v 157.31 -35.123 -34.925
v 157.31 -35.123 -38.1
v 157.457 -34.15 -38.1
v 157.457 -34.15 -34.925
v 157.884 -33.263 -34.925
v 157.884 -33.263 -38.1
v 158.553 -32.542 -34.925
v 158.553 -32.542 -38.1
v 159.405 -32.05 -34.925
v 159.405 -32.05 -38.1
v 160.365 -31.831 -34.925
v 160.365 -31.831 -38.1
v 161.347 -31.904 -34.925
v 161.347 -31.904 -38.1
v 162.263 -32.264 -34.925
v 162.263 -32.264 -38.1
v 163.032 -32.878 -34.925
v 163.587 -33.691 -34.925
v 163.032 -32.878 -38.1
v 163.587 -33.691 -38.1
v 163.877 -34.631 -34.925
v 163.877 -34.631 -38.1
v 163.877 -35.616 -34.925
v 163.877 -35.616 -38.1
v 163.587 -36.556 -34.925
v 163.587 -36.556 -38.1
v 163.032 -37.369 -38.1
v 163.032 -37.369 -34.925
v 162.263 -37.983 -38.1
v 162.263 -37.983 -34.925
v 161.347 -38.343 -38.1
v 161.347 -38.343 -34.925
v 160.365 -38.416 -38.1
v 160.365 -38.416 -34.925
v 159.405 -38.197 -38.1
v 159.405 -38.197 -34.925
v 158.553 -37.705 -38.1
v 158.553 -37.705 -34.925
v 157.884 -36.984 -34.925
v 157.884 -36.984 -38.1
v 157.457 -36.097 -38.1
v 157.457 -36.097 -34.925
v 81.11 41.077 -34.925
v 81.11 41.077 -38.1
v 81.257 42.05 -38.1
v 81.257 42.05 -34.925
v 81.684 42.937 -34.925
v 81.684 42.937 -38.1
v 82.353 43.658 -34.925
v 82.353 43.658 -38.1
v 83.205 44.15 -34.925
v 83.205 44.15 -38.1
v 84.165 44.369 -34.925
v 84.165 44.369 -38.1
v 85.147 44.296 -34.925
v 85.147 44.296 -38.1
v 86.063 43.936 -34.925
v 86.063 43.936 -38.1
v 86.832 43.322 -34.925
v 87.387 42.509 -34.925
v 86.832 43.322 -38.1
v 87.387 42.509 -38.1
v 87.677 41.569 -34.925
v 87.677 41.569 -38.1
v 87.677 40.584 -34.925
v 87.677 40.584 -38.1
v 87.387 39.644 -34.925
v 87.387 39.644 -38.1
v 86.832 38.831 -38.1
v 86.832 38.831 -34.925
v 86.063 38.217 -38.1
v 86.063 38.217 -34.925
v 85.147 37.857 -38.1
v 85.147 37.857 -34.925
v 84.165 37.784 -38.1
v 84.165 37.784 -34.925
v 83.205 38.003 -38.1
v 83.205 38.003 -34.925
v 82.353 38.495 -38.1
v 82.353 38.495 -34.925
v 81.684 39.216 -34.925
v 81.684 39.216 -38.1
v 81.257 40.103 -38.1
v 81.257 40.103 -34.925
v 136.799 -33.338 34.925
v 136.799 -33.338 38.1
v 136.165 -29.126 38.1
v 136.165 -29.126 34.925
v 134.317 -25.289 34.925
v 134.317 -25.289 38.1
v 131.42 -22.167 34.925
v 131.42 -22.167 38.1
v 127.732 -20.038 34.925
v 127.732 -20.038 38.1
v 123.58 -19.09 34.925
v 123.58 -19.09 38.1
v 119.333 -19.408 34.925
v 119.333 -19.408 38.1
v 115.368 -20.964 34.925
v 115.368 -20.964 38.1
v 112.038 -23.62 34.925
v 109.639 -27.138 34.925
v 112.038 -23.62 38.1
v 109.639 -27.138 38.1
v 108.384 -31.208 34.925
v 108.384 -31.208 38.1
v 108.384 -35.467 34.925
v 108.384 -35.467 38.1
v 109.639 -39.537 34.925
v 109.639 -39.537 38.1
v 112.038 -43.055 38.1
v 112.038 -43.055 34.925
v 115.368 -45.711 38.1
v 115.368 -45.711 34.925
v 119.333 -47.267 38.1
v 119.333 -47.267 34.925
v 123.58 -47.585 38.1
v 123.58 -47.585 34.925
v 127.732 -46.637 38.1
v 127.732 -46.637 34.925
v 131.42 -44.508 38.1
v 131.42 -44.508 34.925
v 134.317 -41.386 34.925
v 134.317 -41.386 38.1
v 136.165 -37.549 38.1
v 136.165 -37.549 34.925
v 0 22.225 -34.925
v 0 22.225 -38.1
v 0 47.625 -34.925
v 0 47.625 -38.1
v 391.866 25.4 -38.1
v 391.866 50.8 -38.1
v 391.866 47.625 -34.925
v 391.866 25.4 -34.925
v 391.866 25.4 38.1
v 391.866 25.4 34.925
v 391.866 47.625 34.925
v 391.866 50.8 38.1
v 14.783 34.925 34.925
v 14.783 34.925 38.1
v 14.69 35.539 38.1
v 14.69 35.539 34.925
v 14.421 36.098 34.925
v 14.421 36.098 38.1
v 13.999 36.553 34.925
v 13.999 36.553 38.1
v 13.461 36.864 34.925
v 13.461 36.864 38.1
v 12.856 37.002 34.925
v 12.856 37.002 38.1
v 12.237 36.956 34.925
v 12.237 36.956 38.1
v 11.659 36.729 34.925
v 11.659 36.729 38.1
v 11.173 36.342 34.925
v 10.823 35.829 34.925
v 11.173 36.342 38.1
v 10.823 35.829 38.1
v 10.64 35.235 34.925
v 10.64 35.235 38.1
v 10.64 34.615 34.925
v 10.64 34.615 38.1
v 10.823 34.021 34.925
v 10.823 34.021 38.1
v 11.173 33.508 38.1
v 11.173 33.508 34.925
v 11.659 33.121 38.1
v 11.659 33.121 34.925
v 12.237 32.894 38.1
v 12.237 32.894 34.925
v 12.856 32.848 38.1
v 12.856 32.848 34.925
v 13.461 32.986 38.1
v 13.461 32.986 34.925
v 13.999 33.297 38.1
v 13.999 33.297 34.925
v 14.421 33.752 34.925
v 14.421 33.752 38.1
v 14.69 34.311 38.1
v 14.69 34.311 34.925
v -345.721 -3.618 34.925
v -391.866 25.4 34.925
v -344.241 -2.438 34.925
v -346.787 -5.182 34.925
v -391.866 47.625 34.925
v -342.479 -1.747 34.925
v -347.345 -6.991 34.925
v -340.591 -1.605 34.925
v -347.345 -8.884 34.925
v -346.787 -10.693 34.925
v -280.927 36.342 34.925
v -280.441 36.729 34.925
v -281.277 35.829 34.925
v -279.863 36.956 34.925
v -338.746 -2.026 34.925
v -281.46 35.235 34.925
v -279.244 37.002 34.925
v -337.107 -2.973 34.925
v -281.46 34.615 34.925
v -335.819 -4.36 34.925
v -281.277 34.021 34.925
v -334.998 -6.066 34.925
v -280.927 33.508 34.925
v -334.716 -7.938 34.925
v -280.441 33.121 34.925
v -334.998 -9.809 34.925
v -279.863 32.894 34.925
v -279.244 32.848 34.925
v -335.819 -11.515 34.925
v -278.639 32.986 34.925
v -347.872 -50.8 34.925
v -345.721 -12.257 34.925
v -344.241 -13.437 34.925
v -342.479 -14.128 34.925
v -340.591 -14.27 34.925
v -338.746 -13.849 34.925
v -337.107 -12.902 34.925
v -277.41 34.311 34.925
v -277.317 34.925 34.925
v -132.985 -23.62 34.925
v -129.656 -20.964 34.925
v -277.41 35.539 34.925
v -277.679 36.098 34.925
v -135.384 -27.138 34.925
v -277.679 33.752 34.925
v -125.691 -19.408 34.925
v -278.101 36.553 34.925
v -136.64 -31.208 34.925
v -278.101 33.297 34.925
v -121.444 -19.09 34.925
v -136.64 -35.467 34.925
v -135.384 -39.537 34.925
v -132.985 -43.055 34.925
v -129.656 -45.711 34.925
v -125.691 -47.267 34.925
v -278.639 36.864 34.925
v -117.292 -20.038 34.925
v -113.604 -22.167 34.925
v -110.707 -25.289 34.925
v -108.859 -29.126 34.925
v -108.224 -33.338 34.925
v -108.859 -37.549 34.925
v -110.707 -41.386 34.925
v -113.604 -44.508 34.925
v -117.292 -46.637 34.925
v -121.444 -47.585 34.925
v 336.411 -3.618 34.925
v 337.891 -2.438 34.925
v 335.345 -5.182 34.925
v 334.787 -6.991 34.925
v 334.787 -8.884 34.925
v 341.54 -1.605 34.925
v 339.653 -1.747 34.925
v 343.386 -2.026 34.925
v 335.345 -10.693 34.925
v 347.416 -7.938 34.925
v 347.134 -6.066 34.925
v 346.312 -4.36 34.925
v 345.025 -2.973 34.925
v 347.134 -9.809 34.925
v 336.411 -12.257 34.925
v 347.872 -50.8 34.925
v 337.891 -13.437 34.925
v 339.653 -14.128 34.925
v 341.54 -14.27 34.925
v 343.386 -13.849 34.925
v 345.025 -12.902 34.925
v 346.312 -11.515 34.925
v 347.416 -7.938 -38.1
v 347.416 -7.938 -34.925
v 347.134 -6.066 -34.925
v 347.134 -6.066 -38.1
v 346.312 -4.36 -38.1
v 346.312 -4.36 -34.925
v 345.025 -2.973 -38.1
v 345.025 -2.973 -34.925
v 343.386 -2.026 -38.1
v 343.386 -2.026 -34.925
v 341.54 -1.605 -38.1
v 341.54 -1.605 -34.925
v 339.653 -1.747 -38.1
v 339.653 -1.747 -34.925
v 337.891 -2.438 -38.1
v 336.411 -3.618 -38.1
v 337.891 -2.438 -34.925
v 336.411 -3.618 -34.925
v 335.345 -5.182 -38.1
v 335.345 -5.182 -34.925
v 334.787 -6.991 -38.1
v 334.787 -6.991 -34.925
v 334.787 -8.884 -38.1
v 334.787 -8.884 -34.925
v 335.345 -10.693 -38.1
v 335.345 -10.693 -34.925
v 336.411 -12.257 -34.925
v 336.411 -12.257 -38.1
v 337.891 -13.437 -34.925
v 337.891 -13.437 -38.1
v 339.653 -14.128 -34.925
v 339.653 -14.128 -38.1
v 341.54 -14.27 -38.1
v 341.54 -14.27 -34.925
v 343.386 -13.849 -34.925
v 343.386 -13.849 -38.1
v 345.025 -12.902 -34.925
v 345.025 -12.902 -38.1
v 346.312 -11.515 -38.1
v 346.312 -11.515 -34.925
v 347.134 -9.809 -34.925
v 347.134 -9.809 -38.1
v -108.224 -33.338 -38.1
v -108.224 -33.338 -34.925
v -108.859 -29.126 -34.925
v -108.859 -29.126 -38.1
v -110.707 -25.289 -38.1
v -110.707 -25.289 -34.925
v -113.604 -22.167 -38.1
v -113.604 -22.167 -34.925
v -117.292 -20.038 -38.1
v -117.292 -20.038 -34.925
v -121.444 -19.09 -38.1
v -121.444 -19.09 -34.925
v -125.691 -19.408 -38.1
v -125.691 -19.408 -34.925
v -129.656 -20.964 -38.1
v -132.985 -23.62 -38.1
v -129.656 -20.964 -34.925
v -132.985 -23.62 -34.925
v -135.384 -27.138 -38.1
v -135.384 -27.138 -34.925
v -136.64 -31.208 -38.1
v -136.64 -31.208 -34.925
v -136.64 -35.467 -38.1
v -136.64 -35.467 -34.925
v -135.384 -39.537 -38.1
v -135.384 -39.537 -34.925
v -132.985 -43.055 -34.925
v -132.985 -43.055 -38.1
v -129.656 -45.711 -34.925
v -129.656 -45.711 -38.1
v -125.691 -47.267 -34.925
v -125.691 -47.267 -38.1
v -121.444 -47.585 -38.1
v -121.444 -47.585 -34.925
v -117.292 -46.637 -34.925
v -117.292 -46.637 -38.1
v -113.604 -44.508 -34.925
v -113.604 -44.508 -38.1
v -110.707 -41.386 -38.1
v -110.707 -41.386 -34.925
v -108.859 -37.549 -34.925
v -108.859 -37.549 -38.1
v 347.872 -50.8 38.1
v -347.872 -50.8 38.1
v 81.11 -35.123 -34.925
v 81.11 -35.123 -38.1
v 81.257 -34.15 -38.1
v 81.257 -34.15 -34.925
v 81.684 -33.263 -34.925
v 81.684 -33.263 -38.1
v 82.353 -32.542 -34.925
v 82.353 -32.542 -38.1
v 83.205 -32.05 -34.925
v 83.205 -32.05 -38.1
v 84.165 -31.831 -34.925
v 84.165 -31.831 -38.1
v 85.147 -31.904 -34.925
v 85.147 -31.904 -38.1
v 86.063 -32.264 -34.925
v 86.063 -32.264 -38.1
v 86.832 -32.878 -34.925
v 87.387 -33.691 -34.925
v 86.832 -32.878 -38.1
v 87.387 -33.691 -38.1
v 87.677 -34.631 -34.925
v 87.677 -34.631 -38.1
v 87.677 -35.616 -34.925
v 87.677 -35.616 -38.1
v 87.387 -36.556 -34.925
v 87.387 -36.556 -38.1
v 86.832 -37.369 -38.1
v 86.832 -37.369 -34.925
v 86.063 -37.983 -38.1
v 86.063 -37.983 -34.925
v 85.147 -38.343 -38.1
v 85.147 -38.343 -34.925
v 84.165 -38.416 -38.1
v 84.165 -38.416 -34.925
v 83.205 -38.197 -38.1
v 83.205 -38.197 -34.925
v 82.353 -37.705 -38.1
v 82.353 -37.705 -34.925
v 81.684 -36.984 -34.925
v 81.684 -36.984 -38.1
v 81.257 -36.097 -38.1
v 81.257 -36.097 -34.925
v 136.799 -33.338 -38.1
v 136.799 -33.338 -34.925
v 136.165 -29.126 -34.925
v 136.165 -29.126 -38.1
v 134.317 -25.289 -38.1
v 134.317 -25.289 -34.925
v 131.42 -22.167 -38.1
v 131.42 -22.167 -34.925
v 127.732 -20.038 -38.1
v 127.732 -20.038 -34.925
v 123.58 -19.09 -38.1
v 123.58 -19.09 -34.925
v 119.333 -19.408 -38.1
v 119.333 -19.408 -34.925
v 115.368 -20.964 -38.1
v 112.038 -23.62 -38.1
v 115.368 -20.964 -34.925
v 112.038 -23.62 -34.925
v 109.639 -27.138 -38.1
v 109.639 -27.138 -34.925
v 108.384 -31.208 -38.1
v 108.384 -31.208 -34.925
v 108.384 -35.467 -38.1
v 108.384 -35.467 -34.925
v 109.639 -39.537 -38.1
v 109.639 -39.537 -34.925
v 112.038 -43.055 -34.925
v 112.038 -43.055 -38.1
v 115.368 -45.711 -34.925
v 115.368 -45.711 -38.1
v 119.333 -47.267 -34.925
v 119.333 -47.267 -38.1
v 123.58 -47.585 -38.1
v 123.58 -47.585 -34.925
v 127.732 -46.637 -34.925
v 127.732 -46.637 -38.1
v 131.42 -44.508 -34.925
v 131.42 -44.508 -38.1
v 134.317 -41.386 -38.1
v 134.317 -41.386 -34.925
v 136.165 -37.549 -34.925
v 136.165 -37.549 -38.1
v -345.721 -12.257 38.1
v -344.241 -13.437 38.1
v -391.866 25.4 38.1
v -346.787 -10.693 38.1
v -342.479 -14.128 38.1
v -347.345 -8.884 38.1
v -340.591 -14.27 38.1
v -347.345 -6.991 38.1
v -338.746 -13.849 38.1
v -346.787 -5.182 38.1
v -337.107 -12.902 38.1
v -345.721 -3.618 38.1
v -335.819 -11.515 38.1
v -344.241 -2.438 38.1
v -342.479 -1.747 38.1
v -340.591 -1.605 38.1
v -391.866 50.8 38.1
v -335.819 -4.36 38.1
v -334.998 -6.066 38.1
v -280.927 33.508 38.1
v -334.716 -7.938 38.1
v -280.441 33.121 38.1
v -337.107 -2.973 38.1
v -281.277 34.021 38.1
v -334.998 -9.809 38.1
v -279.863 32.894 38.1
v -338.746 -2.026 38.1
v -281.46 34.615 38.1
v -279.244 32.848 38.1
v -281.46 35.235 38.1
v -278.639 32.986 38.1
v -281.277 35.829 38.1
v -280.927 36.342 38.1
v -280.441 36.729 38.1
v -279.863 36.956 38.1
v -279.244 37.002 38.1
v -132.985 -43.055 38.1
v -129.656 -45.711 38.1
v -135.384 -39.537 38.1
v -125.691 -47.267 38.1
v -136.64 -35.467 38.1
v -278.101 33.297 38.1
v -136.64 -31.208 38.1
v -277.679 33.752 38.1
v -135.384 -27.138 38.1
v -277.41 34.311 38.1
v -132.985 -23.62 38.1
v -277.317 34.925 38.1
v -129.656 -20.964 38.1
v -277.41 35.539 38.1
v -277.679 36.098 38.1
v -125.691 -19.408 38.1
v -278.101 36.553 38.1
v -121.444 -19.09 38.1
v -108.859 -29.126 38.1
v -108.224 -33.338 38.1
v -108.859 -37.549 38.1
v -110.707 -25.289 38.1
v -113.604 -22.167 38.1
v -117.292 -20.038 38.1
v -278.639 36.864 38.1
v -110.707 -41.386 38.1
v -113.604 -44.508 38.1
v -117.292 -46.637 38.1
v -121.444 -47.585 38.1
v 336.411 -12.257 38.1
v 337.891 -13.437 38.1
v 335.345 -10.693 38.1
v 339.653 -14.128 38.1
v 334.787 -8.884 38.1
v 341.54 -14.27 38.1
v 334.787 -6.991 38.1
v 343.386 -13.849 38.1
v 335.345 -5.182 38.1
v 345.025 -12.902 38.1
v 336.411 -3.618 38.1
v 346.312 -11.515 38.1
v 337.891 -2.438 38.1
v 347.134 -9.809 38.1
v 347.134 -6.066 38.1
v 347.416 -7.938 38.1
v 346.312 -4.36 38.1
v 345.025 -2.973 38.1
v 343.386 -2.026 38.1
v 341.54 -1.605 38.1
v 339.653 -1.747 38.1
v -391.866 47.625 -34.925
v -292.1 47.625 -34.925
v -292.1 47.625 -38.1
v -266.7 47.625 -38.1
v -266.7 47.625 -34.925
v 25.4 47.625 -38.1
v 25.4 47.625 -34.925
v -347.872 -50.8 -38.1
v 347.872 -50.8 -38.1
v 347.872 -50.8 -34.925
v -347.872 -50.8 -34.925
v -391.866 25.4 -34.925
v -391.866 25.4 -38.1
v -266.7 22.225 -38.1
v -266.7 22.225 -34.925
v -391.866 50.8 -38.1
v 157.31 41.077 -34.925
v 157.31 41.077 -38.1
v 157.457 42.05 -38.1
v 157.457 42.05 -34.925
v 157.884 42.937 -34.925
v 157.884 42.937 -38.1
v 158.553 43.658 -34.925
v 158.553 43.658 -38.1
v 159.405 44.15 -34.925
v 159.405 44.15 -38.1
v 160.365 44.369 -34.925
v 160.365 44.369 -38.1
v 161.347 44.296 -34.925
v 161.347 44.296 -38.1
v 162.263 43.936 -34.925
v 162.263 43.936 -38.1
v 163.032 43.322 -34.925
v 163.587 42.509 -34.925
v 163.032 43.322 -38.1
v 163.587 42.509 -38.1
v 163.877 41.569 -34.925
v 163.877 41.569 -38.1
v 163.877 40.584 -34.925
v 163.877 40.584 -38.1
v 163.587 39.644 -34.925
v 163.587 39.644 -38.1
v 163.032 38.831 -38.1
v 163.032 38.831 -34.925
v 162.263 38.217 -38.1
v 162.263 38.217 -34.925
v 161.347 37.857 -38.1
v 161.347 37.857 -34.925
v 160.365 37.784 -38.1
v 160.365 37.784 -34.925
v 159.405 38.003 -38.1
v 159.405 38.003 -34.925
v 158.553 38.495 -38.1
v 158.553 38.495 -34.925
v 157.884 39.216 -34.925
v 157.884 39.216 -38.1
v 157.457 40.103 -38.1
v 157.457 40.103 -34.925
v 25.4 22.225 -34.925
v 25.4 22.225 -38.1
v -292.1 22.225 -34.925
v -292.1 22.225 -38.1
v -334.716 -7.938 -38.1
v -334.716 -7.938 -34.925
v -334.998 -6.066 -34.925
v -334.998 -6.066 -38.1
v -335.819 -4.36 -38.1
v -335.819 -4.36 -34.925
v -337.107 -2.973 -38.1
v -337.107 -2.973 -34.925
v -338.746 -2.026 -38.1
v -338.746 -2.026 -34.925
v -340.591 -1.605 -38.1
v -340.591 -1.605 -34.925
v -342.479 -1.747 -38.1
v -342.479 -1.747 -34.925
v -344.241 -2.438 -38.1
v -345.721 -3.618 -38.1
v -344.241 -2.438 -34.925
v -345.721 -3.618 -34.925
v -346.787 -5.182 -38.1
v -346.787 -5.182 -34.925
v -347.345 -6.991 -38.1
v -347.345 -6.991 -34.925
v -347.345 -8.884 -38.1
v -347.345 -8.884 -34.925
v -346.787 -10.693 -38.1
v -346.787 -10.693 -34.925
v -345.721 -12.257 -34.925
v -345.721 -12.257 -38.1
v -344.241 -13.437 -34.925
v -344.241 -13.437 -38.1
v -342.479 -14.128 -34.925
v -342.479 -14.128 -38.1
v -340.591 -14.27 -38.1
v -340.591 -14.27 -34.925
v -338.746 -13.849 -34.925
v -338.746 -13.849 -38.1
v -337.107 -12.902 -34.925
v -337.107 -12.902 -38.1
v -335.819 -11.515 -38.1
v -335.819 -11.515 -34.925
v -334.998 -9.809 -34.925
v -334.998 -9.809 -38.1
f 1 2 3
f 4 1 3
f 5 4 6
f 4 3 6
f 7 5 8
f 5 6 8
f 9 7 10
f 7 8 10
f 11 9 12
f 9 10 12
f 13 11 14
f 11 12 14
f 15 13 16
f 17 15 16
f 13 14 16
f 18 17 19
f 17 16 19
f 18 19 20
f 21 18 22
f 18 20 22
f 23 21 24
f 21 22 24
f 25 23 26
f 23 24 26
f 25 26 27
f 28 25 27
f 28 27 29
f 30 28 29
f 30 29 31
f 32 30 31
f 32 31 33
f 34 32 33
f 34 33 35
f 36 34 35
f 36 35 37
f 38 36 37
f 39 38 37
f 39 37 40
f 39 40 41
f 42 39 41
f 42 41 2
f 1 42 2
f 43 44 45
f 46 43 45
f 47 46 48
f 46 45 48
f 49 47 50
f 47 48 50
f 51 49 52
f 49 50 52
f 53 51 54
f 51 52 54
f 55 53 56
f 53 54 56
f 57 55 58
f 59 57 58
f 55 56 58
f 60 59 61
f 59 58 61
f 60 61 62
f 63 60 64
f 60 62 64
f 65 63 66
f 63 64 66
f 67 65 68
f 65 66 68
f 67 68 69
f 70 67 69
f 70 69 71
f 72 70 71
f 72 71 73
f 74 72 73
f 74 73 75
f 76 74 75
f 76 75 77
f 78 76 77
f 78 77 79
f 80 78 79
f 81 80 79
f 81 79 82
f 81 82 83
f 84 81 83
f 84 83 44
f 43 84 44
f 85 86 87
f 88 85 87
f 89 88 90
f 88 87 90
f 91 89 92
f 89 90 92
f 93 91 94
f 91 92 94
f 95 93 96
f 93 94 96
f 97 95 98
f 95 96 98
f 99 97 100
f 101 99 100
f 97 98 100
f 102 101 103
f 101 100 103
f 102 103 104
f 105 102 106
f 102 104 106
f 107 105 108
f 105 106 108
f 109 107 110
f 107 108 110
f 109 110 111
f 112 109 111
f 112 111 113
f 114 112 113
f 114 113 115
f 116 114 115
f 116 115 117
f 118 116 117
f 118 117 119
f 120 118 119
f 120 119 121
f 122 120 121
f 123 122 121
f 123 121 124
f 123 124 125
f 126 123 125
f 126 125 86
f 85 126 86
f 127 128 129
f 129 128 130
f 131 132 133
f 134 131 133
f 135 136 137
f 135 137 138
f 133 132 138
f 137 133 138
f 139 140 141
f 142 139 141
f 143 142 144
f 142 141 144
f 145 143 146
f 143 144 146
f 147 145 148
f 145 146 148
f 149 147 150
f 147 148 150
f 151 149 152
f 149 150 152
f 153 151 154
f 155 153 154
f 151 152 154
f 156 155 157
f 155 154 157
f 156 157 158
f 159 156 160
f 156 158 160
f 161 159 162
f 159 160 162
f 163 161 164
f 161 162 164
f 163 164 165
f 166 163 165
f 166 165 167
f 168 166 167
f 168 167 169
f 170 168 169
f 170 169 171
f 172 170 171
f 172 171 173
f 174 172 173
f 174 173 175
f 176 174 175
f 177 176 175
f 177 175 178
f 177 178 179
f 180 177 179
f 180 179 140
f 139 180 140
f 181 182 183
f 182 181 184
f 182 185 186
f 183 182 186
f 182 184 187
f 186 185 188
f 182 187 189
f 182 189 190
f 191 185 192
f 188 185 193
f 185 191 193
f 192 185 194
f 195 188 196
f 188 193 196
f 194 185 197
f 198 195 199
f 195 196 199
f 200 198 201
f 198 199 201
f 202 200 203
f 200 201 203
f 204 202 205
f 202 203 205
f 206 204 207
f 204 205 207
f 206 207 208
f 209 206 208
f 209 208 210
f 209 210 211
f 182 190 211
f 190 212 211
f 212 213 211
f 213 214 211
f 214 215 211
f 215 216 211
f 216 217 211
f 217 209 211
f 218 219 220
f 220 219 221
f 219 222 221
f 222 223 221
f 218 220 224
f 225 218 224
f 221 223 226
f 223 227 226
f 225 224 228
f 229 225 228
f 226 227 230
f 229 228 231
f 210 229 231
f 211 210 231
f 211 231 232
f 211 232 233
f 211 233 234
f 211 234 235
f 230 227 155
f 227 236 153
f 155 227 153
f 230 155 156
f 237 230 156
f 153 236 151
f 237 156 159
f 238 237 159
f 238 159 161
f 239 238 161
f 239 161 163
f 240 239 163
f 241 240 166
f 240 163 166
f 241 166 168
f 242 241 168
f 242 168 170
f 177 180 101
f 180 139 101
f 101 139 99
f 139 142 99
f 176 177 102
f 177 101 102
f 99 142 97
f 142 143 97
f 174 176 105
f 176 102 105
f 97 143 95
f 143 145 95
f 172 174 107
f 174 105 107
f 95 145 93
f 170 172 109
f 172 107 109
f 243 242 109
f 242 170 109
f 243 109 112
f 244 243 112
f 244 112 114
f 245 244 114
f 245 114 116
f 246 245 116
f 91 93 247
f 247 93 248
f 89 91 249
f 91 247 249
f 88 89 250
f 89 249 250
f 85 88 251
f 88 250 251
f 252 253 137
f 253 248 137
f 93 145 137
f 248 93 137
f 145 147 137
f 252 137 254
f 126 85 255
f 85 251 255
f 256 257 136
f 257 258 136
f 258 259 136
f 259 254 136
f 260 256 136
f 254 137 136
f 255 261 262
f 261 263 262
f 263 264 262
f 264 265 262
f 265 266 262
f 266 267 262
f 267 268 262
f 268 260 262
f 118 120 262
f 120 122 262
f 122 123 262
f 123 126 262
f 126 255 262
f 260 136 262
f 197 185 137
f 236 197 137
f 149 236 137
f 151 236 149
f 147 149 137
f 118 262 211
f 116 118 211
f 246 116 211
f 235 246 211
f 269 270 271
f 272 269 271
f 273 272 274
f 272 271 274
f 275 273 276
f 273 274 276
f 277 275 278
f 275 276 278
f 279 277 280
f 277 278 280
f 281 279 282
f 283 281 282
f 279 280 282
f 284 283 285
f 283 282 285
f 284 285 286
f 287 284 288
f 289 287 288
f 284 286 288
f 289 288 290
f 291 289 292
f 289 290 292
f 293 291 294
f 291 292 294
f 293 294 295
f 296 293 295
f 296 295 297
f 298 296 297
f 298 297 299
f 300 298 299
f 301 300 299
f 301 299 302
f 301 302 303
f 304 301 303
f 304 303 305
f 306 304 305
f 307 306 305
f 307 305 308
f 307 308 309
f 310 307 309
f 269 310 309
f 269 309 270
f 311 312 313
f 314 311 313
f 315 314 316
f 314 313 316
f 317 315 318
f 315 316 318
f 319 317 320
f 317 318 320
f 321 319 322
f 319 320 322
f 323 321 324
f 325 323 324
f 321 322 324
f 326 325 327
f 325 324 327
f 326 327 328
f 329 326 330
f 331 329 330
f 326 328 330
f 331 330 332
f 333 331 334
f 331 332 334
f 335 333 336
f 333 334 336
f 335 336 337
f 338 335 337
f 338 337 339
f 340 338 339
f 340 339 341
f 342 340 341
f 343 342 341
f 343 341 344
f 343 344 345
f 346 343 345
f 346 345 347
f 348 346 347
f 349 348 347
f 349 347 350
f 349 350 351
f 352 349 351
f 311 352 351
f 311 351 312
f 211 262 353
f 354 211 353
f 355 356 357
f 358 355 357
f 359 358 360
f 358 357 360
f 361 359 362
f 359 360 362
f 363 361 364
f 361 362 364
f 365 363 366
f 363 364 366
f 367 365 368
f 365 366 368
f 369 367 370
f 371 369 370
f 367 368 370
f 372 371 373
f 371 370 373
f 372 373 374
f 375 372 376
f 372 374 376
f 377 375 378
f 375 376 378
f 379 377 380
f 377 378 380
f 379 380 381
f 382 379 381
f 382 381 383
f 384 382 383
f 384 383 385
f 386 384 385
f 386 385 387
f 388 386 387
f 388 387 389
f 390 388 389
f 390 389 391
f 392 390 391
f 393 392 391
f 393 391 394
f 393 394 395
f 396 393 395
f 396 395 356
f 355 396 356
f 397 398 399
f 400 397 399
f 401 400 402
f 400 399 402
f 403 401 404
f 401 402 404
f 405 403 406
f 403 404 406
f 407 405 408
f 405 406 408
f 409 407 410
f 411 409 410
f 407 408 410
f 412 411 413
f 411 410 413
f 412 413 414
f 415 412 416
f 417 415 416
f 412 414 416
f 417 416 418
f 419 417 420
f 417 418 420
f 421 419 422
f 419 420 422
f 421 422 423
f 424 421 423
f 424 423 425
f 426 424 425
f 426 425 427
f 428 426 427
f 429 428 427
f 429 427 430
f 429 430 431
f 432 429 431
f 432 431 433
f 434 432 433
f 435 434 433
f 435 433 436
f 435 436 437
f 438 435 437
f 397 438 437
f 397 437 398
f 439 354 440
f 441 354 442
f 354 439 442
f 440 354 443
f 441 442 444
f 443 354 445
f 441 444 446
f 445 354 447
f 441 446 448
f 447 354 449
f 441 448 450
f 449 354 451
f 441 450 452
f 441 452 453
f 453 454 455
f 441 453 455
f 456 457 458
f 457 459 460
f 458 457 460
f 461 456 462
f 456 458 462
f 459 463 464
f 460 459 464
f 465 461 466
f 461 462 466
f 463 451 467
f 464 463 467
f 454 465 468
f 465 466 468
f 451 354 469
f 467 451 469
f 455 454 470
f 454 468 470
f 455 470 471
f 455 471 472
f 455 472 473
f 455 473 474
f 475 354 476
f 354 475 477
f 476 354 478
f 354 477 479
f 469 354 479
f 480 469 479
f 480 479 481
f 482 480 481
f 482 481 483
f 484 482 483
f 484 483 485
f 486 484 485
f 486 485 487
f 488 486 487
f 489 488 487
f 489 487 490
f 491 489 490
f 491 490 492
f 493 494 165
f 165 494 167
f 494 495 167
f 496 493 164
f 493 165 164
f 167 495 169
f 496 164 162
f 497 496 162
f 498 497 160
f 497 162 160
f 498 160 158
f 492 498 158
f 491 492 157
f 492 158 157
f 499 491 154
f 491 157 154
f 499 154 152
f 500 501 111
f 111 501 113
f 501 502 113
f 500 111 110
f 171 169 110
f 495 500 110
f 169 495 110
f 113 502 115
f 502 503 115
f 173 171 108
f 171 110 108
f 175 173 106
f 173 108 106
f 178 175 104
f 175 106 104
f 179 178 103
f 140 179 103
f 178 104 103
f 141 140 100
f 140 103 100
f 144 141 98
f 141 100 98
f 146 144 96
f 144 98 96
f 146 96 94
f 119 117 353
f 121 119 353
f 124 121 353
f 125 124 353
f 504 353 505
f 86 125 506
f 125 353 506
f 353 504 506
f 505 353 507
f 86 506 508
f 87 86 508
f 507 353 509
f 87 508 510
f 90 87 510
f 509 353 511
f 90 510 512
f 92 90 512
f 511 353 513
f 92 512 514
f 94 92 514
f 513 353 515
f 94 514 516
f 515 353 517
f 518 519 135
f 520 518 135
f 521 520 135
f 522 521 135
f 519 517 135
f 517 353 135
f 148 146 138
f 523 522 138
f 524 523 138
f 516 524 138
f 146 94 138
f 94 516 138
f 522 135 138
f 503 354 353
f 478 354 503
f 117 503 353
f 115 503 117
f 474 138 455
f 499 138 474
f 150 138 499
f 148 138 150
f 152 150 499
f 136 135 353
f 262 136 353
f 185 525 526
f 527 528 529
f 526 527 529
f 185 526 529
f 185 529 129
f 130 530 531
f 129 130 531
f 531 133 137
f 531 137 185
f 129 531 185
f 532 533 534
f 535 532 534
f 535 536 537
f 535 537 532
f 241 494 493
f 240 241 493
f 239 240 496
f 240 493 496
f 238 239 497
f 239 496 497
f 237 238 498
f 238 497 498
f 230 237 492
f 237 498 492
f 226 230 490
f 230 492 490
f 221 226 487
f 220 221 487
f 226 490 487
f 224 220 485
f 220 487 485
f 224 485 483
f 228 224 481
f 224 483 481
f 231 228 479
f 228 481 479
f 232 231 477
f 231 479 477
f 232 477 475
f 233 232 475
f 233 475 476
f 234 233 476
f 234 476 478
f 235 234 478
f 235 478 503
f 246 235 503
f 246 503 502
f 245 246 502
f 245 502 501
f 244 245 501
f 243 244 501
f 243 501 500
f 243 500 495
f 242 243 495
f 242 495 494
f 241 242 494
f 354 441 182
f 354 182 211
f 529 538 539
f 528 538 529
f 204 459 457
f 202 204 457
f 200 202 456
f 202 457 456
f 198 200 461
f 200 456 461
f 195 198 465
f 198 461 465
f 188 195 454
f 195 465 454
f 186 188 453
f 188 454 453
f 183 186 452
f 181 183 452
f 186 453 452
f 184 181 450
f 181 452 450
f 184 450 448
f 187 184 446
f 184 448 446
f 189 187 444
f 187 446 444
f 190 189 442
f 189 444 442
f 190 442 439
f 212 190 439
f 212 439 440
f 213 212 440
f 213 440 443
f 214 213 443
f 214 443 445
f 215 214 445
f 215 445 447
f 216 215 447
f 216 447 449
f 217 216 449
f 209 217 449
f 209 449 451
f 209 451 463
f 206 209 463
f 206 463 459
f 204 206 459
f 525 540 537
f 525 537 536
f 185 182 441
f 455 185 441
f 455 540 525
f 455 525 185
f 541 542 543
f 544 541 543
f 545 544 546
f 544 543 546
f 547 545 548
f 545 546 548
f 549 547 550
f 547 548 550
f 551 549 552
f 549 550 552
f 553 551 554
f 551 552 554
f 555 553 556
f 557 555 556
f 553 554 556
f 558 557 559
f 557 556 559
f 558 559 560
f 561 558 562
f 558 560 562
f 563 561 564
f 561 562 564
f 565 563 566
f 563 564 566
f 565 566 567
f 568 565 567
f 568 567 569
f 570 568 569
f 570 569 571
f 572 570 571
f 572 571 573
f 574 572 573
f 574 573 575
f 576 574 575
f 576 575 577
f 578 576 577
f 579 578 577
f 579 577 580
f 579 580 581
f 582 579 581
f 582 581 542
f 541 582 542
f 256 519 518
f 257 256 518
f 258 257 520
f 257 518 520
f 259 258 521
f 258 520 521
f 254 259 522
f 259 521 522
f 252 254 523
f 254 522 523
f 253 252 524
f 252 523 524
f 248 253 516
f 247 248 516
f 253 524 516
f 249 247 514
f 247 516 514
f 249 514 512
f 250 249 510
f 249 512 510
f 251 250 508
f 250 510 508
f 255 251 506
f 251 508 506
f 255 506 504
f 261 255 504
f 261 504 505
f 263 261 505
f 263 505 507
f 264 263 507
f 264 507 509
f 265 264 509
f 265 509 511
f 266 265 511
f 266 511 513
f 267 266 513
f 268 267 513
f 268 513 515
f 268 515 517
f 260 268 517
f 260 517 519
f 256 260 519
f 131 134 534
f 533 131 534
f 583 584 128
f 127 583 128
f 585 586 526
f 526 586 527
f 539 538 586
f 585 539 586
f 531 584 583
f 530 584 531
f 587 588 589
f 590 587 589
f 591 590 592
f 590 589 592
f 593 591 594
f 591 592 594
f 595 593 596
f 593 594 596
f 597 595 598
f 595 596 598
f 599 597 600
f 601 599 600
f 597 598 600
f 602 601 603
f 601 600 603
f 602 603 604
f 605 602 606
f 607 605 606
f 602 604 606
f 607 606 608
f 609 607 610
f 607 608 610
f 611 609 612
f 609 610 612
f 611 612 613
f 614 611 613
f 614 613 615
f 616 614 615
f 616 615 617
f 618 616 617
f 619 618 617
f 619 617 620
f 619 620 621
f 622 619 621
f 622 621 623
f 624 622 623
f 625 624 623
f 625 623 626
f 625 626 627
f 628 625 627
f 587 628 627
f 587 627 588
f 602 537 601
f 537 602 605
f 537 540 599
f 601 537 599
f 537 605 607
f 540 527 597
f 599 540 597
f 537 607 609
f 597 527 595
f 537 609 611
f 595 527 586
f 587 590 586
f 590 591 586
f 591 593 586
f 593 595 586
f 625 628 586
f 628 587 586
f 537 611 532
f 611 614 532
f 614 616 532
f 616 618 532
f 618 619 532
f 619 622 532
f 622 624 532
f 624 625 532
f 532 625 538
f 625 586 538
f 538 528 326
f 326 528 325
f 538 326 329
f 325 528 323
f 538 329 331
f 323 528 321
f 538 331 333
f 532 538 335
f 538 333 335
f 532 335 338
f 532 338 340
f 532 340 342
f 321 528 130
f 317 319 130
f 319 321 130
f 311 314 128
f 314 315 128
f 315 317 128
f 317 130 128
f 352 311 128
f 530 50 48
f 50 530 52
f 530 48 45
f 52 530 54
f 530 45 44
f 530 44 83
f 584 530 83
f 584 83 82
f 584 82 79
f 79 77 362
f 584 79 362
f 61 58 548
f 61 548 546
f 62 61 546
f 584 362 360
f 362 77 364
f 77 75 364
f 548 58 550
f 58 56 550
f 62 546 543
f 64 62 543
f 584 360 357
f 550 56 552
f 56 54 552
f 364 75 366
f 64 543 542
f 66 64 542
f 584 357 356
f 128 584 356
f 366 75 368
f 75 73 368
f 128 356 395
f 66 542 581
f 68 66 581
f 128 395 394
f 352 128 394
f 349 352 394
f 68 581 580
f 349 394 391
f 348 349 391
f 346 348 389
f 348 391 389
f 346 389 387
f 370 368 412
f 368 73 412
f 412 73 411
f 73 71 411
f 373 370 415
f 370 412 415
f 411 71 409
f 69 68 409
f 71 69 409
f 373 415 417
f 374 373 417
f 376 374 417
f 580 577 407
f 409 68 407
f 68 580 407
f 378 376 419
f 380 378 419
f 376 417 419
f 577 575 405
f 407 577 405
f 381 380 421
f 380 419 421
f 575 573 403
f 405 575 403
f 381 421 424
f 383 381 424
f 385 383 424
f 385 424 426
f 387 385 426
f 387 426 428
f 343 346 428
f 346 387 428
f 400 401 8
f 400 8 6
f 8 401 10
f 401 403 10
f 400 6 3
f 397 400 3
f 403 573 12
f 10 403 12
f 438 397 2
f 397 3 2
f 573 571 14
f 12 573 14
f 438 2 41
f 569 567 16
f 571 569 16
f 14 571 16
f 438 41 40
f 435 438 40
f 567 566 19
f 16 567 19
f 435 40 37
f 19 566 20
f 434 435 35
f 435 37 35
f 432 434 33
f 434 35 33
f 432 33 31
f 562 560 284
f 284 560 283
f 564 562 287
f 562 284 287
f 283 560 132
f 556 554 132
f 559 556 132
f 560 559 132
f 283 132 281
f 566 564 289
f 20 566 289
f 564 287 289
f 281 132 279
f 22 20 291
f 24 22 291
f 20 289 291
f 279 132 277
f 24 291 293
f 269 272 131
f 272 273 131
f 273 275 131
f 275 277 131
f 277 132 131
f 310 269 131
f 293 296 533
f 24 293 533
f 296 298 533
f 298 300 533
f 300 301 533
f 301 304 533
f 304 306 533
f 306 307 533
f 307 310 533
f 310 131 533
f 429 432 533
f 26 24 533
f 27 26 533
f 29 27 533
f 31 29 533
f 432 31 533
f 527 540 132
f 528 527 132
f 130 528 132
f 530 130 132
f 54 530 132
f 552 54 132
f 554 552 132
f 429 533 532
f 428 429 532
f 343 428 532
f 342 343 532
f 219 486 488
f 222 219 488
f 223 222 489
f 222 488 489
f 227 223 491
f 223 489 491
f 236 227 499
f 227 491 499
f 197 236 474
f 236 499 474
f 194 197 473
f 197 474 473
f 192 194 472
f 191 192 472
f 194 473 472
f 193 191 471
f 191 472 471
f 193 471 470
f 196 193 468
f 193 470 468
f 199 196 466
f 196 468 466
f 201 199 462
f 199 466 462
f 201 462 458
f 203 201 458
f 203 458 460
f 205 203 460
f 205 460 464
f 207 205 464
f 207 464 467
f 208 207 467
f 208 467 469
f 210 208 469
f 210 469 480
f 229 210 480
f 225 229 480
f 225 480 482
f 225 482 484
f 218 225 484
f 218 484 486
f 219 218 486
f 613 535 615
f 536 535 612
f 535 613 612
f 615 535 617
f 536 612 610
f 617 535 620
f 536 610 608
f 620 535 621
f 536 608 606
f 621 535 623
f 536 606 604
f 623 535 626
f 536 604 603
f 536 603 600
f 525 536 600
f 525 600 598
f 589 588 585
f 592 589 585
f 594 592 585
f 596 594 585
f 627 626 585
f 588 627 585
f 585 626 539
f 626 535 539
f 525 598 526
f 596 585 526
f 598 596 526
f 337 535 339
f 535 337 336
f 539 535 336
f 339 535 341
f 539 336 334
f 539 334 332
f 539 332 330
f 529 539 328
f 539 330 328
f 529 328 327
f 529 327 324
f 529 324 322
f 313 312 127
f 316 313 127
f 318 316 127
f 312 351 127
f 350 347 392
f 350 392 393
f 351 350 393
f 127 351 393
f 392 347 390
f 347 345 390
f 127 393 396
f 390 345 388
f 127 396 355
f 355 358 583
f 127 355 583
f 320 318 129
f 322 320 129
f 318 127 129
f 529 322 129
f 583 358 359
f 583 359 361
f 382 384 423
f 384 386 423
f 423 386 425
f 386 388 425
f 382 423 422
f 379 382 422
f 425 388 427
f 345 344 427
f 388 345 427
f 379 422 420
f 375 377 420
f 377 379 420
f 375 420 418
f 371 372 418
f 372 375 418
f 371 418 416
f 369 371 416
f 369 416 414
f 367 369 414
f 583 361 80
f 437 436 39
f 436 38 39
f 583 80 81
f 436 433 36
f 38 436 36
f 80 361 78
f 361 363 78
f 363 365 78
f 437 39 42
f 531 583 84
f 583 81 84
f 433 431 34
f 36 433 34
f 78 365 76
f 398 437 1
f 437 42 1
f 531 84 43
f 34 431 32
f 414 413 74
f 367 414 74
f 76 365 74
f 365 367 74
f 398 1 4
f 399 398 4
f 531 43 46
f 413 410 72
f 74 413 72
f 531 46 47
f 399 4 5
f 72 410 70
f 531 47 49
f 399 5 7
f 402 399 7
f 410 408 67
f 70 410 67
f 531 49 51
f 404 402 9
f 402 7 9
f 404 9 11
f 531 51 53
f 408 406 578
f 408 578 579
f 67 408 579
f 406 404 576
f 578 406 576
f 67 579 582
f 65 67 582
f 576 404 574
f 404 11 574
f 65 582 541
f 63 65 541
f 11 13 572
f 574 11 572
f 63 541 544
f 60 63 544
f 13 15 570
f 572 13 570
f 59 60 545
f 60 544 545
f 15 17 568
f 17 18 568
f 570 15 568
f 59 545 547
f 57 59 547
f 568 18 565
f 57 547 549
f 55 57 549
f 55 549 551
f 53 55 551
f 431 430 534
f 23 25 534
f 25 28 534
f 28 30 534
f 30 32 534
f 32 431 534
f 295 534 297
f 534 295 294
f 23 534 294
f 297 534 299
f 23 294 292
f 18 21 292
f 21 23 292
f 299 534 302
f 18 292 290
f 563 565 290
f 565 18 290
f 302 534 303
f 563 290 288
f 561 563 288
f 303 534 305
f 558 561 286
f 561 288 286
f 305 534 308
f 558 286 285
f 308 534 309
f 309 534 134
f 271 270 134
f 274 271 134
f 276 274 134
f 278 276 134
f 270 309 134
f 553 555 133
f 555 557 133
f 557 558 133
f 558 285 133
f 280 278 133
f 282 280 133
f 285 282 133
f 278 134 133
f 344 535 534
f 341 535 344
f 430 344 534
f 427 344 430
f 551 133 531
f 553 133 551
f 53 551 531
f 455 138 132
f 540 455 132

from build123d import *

# Parameters (mm, degrees)
BOSS_EXTRUDE1_DEPTH = 391.865756272
SKETCH2_R           = 6.35
SKETCH2_R_2         = 14.2875
SKETCH2_R_3         = 2.0828
CUT_EXTRUDE1_DEPTH  = 141.732
SKETCH14_R          = 3.302
SKETCH14_W          = 25.4
SKETCH14_H          = 25.4
CUT_EXTRUDE12_DEPTH = 23.114
CUT_EXTRUDE13_DEPTH = 101.6


with BuildPart() as part:
    # Sketch1 → Boss-Extrude1 (new body, symmetric)
    with BuildSketch(Plane(origin=(0, 0, 0), x_dir=(0, 0, -1), z_dir=(1, 0, 0))):
        Polygon((-38.1, 50.8), (38.1, 50.8), (38.1, -50.8), (34.925, -50.8), (34.925, 47.625), (-34.925, 47.625), (-34.925, -50.8), (-38.1, -50.8), align=None)
    extrude(amount=BOSS_EXTRUDE1_DEPTH, both=True)

    # Sketch2 → Cut-Extrude1 (cut)
    with BuildSketch(Plane.XY.offset(38.1)):
        with Locations((-341.065756187, -7.9375)):
            Circle(SKETCH2_R)
        with Locations((122.51182, -33.3375)):
            Circle(SKETCH2_R_2)
        with Locations((341.065756187, -7.9375)):
            Circle(SKETCH2_R)
        with Locations((12.7, 34.925)):
            Circle(SKETCH2_R_3)
        with Locations((-279.4, 34.925)):
            Circle(SKETCH2_R_3)
        with Locations((-122.51182, -33.3375)):
            Circle(SKETCH2_R_2)
    extrude(amount=-CUT_EXTRUDE1_DEPTH, mode=Mode.SUBTRACT)

    # Sketch14 → Cut-Extrude12 (cut)
    with BuildSketch(Plane(origin=(0, 0, -38.1), x_dir=(-1, 0, 0), z_dir=(0, 0, -1))):
        with Locations((-160.61182, -35.123476108)):
            Circle(SKETCH14_R)
        with Locations((-160.61182, 41.076523892)):
            Circle(SKETCH14_R)
        with Locations((-84.41182, 41.076523892)):
            Circle(SKETCH14_R)
        with Locations((-84.41182, -35.123476108)):
            Circle(SKETCH14_R)
        with Locations((-12.7, 34.925)):
            Rectangle(SKETCH14_W, SKETCH14_H)
        with Locations((279.4, 34.925)):
            Rectangle(SKETCH14_W, SKETCH14_H)
    extrude(amount=-CUT_EXTRUDE12_DEPTH, mode=Mode.SUBTRACT)

    # Sketch16 → Cut-Extrude13 (cut)
    with BuildSketch(Plane.XY.offset(38.1)):
        Polygon((-391.865756272, 25.4), (-347.87166576, -50.8), (-391.865756272, -50.8), align=None)
        Polygon((347.87166576, -50.8), (391.865756272, -50.8), (391.865756272, 25.4), align=None)
    extrude(amount=-CUT_EXTRUDE13_DEPTH, mode=Mode.SUBTRACT)


solid = part.part
